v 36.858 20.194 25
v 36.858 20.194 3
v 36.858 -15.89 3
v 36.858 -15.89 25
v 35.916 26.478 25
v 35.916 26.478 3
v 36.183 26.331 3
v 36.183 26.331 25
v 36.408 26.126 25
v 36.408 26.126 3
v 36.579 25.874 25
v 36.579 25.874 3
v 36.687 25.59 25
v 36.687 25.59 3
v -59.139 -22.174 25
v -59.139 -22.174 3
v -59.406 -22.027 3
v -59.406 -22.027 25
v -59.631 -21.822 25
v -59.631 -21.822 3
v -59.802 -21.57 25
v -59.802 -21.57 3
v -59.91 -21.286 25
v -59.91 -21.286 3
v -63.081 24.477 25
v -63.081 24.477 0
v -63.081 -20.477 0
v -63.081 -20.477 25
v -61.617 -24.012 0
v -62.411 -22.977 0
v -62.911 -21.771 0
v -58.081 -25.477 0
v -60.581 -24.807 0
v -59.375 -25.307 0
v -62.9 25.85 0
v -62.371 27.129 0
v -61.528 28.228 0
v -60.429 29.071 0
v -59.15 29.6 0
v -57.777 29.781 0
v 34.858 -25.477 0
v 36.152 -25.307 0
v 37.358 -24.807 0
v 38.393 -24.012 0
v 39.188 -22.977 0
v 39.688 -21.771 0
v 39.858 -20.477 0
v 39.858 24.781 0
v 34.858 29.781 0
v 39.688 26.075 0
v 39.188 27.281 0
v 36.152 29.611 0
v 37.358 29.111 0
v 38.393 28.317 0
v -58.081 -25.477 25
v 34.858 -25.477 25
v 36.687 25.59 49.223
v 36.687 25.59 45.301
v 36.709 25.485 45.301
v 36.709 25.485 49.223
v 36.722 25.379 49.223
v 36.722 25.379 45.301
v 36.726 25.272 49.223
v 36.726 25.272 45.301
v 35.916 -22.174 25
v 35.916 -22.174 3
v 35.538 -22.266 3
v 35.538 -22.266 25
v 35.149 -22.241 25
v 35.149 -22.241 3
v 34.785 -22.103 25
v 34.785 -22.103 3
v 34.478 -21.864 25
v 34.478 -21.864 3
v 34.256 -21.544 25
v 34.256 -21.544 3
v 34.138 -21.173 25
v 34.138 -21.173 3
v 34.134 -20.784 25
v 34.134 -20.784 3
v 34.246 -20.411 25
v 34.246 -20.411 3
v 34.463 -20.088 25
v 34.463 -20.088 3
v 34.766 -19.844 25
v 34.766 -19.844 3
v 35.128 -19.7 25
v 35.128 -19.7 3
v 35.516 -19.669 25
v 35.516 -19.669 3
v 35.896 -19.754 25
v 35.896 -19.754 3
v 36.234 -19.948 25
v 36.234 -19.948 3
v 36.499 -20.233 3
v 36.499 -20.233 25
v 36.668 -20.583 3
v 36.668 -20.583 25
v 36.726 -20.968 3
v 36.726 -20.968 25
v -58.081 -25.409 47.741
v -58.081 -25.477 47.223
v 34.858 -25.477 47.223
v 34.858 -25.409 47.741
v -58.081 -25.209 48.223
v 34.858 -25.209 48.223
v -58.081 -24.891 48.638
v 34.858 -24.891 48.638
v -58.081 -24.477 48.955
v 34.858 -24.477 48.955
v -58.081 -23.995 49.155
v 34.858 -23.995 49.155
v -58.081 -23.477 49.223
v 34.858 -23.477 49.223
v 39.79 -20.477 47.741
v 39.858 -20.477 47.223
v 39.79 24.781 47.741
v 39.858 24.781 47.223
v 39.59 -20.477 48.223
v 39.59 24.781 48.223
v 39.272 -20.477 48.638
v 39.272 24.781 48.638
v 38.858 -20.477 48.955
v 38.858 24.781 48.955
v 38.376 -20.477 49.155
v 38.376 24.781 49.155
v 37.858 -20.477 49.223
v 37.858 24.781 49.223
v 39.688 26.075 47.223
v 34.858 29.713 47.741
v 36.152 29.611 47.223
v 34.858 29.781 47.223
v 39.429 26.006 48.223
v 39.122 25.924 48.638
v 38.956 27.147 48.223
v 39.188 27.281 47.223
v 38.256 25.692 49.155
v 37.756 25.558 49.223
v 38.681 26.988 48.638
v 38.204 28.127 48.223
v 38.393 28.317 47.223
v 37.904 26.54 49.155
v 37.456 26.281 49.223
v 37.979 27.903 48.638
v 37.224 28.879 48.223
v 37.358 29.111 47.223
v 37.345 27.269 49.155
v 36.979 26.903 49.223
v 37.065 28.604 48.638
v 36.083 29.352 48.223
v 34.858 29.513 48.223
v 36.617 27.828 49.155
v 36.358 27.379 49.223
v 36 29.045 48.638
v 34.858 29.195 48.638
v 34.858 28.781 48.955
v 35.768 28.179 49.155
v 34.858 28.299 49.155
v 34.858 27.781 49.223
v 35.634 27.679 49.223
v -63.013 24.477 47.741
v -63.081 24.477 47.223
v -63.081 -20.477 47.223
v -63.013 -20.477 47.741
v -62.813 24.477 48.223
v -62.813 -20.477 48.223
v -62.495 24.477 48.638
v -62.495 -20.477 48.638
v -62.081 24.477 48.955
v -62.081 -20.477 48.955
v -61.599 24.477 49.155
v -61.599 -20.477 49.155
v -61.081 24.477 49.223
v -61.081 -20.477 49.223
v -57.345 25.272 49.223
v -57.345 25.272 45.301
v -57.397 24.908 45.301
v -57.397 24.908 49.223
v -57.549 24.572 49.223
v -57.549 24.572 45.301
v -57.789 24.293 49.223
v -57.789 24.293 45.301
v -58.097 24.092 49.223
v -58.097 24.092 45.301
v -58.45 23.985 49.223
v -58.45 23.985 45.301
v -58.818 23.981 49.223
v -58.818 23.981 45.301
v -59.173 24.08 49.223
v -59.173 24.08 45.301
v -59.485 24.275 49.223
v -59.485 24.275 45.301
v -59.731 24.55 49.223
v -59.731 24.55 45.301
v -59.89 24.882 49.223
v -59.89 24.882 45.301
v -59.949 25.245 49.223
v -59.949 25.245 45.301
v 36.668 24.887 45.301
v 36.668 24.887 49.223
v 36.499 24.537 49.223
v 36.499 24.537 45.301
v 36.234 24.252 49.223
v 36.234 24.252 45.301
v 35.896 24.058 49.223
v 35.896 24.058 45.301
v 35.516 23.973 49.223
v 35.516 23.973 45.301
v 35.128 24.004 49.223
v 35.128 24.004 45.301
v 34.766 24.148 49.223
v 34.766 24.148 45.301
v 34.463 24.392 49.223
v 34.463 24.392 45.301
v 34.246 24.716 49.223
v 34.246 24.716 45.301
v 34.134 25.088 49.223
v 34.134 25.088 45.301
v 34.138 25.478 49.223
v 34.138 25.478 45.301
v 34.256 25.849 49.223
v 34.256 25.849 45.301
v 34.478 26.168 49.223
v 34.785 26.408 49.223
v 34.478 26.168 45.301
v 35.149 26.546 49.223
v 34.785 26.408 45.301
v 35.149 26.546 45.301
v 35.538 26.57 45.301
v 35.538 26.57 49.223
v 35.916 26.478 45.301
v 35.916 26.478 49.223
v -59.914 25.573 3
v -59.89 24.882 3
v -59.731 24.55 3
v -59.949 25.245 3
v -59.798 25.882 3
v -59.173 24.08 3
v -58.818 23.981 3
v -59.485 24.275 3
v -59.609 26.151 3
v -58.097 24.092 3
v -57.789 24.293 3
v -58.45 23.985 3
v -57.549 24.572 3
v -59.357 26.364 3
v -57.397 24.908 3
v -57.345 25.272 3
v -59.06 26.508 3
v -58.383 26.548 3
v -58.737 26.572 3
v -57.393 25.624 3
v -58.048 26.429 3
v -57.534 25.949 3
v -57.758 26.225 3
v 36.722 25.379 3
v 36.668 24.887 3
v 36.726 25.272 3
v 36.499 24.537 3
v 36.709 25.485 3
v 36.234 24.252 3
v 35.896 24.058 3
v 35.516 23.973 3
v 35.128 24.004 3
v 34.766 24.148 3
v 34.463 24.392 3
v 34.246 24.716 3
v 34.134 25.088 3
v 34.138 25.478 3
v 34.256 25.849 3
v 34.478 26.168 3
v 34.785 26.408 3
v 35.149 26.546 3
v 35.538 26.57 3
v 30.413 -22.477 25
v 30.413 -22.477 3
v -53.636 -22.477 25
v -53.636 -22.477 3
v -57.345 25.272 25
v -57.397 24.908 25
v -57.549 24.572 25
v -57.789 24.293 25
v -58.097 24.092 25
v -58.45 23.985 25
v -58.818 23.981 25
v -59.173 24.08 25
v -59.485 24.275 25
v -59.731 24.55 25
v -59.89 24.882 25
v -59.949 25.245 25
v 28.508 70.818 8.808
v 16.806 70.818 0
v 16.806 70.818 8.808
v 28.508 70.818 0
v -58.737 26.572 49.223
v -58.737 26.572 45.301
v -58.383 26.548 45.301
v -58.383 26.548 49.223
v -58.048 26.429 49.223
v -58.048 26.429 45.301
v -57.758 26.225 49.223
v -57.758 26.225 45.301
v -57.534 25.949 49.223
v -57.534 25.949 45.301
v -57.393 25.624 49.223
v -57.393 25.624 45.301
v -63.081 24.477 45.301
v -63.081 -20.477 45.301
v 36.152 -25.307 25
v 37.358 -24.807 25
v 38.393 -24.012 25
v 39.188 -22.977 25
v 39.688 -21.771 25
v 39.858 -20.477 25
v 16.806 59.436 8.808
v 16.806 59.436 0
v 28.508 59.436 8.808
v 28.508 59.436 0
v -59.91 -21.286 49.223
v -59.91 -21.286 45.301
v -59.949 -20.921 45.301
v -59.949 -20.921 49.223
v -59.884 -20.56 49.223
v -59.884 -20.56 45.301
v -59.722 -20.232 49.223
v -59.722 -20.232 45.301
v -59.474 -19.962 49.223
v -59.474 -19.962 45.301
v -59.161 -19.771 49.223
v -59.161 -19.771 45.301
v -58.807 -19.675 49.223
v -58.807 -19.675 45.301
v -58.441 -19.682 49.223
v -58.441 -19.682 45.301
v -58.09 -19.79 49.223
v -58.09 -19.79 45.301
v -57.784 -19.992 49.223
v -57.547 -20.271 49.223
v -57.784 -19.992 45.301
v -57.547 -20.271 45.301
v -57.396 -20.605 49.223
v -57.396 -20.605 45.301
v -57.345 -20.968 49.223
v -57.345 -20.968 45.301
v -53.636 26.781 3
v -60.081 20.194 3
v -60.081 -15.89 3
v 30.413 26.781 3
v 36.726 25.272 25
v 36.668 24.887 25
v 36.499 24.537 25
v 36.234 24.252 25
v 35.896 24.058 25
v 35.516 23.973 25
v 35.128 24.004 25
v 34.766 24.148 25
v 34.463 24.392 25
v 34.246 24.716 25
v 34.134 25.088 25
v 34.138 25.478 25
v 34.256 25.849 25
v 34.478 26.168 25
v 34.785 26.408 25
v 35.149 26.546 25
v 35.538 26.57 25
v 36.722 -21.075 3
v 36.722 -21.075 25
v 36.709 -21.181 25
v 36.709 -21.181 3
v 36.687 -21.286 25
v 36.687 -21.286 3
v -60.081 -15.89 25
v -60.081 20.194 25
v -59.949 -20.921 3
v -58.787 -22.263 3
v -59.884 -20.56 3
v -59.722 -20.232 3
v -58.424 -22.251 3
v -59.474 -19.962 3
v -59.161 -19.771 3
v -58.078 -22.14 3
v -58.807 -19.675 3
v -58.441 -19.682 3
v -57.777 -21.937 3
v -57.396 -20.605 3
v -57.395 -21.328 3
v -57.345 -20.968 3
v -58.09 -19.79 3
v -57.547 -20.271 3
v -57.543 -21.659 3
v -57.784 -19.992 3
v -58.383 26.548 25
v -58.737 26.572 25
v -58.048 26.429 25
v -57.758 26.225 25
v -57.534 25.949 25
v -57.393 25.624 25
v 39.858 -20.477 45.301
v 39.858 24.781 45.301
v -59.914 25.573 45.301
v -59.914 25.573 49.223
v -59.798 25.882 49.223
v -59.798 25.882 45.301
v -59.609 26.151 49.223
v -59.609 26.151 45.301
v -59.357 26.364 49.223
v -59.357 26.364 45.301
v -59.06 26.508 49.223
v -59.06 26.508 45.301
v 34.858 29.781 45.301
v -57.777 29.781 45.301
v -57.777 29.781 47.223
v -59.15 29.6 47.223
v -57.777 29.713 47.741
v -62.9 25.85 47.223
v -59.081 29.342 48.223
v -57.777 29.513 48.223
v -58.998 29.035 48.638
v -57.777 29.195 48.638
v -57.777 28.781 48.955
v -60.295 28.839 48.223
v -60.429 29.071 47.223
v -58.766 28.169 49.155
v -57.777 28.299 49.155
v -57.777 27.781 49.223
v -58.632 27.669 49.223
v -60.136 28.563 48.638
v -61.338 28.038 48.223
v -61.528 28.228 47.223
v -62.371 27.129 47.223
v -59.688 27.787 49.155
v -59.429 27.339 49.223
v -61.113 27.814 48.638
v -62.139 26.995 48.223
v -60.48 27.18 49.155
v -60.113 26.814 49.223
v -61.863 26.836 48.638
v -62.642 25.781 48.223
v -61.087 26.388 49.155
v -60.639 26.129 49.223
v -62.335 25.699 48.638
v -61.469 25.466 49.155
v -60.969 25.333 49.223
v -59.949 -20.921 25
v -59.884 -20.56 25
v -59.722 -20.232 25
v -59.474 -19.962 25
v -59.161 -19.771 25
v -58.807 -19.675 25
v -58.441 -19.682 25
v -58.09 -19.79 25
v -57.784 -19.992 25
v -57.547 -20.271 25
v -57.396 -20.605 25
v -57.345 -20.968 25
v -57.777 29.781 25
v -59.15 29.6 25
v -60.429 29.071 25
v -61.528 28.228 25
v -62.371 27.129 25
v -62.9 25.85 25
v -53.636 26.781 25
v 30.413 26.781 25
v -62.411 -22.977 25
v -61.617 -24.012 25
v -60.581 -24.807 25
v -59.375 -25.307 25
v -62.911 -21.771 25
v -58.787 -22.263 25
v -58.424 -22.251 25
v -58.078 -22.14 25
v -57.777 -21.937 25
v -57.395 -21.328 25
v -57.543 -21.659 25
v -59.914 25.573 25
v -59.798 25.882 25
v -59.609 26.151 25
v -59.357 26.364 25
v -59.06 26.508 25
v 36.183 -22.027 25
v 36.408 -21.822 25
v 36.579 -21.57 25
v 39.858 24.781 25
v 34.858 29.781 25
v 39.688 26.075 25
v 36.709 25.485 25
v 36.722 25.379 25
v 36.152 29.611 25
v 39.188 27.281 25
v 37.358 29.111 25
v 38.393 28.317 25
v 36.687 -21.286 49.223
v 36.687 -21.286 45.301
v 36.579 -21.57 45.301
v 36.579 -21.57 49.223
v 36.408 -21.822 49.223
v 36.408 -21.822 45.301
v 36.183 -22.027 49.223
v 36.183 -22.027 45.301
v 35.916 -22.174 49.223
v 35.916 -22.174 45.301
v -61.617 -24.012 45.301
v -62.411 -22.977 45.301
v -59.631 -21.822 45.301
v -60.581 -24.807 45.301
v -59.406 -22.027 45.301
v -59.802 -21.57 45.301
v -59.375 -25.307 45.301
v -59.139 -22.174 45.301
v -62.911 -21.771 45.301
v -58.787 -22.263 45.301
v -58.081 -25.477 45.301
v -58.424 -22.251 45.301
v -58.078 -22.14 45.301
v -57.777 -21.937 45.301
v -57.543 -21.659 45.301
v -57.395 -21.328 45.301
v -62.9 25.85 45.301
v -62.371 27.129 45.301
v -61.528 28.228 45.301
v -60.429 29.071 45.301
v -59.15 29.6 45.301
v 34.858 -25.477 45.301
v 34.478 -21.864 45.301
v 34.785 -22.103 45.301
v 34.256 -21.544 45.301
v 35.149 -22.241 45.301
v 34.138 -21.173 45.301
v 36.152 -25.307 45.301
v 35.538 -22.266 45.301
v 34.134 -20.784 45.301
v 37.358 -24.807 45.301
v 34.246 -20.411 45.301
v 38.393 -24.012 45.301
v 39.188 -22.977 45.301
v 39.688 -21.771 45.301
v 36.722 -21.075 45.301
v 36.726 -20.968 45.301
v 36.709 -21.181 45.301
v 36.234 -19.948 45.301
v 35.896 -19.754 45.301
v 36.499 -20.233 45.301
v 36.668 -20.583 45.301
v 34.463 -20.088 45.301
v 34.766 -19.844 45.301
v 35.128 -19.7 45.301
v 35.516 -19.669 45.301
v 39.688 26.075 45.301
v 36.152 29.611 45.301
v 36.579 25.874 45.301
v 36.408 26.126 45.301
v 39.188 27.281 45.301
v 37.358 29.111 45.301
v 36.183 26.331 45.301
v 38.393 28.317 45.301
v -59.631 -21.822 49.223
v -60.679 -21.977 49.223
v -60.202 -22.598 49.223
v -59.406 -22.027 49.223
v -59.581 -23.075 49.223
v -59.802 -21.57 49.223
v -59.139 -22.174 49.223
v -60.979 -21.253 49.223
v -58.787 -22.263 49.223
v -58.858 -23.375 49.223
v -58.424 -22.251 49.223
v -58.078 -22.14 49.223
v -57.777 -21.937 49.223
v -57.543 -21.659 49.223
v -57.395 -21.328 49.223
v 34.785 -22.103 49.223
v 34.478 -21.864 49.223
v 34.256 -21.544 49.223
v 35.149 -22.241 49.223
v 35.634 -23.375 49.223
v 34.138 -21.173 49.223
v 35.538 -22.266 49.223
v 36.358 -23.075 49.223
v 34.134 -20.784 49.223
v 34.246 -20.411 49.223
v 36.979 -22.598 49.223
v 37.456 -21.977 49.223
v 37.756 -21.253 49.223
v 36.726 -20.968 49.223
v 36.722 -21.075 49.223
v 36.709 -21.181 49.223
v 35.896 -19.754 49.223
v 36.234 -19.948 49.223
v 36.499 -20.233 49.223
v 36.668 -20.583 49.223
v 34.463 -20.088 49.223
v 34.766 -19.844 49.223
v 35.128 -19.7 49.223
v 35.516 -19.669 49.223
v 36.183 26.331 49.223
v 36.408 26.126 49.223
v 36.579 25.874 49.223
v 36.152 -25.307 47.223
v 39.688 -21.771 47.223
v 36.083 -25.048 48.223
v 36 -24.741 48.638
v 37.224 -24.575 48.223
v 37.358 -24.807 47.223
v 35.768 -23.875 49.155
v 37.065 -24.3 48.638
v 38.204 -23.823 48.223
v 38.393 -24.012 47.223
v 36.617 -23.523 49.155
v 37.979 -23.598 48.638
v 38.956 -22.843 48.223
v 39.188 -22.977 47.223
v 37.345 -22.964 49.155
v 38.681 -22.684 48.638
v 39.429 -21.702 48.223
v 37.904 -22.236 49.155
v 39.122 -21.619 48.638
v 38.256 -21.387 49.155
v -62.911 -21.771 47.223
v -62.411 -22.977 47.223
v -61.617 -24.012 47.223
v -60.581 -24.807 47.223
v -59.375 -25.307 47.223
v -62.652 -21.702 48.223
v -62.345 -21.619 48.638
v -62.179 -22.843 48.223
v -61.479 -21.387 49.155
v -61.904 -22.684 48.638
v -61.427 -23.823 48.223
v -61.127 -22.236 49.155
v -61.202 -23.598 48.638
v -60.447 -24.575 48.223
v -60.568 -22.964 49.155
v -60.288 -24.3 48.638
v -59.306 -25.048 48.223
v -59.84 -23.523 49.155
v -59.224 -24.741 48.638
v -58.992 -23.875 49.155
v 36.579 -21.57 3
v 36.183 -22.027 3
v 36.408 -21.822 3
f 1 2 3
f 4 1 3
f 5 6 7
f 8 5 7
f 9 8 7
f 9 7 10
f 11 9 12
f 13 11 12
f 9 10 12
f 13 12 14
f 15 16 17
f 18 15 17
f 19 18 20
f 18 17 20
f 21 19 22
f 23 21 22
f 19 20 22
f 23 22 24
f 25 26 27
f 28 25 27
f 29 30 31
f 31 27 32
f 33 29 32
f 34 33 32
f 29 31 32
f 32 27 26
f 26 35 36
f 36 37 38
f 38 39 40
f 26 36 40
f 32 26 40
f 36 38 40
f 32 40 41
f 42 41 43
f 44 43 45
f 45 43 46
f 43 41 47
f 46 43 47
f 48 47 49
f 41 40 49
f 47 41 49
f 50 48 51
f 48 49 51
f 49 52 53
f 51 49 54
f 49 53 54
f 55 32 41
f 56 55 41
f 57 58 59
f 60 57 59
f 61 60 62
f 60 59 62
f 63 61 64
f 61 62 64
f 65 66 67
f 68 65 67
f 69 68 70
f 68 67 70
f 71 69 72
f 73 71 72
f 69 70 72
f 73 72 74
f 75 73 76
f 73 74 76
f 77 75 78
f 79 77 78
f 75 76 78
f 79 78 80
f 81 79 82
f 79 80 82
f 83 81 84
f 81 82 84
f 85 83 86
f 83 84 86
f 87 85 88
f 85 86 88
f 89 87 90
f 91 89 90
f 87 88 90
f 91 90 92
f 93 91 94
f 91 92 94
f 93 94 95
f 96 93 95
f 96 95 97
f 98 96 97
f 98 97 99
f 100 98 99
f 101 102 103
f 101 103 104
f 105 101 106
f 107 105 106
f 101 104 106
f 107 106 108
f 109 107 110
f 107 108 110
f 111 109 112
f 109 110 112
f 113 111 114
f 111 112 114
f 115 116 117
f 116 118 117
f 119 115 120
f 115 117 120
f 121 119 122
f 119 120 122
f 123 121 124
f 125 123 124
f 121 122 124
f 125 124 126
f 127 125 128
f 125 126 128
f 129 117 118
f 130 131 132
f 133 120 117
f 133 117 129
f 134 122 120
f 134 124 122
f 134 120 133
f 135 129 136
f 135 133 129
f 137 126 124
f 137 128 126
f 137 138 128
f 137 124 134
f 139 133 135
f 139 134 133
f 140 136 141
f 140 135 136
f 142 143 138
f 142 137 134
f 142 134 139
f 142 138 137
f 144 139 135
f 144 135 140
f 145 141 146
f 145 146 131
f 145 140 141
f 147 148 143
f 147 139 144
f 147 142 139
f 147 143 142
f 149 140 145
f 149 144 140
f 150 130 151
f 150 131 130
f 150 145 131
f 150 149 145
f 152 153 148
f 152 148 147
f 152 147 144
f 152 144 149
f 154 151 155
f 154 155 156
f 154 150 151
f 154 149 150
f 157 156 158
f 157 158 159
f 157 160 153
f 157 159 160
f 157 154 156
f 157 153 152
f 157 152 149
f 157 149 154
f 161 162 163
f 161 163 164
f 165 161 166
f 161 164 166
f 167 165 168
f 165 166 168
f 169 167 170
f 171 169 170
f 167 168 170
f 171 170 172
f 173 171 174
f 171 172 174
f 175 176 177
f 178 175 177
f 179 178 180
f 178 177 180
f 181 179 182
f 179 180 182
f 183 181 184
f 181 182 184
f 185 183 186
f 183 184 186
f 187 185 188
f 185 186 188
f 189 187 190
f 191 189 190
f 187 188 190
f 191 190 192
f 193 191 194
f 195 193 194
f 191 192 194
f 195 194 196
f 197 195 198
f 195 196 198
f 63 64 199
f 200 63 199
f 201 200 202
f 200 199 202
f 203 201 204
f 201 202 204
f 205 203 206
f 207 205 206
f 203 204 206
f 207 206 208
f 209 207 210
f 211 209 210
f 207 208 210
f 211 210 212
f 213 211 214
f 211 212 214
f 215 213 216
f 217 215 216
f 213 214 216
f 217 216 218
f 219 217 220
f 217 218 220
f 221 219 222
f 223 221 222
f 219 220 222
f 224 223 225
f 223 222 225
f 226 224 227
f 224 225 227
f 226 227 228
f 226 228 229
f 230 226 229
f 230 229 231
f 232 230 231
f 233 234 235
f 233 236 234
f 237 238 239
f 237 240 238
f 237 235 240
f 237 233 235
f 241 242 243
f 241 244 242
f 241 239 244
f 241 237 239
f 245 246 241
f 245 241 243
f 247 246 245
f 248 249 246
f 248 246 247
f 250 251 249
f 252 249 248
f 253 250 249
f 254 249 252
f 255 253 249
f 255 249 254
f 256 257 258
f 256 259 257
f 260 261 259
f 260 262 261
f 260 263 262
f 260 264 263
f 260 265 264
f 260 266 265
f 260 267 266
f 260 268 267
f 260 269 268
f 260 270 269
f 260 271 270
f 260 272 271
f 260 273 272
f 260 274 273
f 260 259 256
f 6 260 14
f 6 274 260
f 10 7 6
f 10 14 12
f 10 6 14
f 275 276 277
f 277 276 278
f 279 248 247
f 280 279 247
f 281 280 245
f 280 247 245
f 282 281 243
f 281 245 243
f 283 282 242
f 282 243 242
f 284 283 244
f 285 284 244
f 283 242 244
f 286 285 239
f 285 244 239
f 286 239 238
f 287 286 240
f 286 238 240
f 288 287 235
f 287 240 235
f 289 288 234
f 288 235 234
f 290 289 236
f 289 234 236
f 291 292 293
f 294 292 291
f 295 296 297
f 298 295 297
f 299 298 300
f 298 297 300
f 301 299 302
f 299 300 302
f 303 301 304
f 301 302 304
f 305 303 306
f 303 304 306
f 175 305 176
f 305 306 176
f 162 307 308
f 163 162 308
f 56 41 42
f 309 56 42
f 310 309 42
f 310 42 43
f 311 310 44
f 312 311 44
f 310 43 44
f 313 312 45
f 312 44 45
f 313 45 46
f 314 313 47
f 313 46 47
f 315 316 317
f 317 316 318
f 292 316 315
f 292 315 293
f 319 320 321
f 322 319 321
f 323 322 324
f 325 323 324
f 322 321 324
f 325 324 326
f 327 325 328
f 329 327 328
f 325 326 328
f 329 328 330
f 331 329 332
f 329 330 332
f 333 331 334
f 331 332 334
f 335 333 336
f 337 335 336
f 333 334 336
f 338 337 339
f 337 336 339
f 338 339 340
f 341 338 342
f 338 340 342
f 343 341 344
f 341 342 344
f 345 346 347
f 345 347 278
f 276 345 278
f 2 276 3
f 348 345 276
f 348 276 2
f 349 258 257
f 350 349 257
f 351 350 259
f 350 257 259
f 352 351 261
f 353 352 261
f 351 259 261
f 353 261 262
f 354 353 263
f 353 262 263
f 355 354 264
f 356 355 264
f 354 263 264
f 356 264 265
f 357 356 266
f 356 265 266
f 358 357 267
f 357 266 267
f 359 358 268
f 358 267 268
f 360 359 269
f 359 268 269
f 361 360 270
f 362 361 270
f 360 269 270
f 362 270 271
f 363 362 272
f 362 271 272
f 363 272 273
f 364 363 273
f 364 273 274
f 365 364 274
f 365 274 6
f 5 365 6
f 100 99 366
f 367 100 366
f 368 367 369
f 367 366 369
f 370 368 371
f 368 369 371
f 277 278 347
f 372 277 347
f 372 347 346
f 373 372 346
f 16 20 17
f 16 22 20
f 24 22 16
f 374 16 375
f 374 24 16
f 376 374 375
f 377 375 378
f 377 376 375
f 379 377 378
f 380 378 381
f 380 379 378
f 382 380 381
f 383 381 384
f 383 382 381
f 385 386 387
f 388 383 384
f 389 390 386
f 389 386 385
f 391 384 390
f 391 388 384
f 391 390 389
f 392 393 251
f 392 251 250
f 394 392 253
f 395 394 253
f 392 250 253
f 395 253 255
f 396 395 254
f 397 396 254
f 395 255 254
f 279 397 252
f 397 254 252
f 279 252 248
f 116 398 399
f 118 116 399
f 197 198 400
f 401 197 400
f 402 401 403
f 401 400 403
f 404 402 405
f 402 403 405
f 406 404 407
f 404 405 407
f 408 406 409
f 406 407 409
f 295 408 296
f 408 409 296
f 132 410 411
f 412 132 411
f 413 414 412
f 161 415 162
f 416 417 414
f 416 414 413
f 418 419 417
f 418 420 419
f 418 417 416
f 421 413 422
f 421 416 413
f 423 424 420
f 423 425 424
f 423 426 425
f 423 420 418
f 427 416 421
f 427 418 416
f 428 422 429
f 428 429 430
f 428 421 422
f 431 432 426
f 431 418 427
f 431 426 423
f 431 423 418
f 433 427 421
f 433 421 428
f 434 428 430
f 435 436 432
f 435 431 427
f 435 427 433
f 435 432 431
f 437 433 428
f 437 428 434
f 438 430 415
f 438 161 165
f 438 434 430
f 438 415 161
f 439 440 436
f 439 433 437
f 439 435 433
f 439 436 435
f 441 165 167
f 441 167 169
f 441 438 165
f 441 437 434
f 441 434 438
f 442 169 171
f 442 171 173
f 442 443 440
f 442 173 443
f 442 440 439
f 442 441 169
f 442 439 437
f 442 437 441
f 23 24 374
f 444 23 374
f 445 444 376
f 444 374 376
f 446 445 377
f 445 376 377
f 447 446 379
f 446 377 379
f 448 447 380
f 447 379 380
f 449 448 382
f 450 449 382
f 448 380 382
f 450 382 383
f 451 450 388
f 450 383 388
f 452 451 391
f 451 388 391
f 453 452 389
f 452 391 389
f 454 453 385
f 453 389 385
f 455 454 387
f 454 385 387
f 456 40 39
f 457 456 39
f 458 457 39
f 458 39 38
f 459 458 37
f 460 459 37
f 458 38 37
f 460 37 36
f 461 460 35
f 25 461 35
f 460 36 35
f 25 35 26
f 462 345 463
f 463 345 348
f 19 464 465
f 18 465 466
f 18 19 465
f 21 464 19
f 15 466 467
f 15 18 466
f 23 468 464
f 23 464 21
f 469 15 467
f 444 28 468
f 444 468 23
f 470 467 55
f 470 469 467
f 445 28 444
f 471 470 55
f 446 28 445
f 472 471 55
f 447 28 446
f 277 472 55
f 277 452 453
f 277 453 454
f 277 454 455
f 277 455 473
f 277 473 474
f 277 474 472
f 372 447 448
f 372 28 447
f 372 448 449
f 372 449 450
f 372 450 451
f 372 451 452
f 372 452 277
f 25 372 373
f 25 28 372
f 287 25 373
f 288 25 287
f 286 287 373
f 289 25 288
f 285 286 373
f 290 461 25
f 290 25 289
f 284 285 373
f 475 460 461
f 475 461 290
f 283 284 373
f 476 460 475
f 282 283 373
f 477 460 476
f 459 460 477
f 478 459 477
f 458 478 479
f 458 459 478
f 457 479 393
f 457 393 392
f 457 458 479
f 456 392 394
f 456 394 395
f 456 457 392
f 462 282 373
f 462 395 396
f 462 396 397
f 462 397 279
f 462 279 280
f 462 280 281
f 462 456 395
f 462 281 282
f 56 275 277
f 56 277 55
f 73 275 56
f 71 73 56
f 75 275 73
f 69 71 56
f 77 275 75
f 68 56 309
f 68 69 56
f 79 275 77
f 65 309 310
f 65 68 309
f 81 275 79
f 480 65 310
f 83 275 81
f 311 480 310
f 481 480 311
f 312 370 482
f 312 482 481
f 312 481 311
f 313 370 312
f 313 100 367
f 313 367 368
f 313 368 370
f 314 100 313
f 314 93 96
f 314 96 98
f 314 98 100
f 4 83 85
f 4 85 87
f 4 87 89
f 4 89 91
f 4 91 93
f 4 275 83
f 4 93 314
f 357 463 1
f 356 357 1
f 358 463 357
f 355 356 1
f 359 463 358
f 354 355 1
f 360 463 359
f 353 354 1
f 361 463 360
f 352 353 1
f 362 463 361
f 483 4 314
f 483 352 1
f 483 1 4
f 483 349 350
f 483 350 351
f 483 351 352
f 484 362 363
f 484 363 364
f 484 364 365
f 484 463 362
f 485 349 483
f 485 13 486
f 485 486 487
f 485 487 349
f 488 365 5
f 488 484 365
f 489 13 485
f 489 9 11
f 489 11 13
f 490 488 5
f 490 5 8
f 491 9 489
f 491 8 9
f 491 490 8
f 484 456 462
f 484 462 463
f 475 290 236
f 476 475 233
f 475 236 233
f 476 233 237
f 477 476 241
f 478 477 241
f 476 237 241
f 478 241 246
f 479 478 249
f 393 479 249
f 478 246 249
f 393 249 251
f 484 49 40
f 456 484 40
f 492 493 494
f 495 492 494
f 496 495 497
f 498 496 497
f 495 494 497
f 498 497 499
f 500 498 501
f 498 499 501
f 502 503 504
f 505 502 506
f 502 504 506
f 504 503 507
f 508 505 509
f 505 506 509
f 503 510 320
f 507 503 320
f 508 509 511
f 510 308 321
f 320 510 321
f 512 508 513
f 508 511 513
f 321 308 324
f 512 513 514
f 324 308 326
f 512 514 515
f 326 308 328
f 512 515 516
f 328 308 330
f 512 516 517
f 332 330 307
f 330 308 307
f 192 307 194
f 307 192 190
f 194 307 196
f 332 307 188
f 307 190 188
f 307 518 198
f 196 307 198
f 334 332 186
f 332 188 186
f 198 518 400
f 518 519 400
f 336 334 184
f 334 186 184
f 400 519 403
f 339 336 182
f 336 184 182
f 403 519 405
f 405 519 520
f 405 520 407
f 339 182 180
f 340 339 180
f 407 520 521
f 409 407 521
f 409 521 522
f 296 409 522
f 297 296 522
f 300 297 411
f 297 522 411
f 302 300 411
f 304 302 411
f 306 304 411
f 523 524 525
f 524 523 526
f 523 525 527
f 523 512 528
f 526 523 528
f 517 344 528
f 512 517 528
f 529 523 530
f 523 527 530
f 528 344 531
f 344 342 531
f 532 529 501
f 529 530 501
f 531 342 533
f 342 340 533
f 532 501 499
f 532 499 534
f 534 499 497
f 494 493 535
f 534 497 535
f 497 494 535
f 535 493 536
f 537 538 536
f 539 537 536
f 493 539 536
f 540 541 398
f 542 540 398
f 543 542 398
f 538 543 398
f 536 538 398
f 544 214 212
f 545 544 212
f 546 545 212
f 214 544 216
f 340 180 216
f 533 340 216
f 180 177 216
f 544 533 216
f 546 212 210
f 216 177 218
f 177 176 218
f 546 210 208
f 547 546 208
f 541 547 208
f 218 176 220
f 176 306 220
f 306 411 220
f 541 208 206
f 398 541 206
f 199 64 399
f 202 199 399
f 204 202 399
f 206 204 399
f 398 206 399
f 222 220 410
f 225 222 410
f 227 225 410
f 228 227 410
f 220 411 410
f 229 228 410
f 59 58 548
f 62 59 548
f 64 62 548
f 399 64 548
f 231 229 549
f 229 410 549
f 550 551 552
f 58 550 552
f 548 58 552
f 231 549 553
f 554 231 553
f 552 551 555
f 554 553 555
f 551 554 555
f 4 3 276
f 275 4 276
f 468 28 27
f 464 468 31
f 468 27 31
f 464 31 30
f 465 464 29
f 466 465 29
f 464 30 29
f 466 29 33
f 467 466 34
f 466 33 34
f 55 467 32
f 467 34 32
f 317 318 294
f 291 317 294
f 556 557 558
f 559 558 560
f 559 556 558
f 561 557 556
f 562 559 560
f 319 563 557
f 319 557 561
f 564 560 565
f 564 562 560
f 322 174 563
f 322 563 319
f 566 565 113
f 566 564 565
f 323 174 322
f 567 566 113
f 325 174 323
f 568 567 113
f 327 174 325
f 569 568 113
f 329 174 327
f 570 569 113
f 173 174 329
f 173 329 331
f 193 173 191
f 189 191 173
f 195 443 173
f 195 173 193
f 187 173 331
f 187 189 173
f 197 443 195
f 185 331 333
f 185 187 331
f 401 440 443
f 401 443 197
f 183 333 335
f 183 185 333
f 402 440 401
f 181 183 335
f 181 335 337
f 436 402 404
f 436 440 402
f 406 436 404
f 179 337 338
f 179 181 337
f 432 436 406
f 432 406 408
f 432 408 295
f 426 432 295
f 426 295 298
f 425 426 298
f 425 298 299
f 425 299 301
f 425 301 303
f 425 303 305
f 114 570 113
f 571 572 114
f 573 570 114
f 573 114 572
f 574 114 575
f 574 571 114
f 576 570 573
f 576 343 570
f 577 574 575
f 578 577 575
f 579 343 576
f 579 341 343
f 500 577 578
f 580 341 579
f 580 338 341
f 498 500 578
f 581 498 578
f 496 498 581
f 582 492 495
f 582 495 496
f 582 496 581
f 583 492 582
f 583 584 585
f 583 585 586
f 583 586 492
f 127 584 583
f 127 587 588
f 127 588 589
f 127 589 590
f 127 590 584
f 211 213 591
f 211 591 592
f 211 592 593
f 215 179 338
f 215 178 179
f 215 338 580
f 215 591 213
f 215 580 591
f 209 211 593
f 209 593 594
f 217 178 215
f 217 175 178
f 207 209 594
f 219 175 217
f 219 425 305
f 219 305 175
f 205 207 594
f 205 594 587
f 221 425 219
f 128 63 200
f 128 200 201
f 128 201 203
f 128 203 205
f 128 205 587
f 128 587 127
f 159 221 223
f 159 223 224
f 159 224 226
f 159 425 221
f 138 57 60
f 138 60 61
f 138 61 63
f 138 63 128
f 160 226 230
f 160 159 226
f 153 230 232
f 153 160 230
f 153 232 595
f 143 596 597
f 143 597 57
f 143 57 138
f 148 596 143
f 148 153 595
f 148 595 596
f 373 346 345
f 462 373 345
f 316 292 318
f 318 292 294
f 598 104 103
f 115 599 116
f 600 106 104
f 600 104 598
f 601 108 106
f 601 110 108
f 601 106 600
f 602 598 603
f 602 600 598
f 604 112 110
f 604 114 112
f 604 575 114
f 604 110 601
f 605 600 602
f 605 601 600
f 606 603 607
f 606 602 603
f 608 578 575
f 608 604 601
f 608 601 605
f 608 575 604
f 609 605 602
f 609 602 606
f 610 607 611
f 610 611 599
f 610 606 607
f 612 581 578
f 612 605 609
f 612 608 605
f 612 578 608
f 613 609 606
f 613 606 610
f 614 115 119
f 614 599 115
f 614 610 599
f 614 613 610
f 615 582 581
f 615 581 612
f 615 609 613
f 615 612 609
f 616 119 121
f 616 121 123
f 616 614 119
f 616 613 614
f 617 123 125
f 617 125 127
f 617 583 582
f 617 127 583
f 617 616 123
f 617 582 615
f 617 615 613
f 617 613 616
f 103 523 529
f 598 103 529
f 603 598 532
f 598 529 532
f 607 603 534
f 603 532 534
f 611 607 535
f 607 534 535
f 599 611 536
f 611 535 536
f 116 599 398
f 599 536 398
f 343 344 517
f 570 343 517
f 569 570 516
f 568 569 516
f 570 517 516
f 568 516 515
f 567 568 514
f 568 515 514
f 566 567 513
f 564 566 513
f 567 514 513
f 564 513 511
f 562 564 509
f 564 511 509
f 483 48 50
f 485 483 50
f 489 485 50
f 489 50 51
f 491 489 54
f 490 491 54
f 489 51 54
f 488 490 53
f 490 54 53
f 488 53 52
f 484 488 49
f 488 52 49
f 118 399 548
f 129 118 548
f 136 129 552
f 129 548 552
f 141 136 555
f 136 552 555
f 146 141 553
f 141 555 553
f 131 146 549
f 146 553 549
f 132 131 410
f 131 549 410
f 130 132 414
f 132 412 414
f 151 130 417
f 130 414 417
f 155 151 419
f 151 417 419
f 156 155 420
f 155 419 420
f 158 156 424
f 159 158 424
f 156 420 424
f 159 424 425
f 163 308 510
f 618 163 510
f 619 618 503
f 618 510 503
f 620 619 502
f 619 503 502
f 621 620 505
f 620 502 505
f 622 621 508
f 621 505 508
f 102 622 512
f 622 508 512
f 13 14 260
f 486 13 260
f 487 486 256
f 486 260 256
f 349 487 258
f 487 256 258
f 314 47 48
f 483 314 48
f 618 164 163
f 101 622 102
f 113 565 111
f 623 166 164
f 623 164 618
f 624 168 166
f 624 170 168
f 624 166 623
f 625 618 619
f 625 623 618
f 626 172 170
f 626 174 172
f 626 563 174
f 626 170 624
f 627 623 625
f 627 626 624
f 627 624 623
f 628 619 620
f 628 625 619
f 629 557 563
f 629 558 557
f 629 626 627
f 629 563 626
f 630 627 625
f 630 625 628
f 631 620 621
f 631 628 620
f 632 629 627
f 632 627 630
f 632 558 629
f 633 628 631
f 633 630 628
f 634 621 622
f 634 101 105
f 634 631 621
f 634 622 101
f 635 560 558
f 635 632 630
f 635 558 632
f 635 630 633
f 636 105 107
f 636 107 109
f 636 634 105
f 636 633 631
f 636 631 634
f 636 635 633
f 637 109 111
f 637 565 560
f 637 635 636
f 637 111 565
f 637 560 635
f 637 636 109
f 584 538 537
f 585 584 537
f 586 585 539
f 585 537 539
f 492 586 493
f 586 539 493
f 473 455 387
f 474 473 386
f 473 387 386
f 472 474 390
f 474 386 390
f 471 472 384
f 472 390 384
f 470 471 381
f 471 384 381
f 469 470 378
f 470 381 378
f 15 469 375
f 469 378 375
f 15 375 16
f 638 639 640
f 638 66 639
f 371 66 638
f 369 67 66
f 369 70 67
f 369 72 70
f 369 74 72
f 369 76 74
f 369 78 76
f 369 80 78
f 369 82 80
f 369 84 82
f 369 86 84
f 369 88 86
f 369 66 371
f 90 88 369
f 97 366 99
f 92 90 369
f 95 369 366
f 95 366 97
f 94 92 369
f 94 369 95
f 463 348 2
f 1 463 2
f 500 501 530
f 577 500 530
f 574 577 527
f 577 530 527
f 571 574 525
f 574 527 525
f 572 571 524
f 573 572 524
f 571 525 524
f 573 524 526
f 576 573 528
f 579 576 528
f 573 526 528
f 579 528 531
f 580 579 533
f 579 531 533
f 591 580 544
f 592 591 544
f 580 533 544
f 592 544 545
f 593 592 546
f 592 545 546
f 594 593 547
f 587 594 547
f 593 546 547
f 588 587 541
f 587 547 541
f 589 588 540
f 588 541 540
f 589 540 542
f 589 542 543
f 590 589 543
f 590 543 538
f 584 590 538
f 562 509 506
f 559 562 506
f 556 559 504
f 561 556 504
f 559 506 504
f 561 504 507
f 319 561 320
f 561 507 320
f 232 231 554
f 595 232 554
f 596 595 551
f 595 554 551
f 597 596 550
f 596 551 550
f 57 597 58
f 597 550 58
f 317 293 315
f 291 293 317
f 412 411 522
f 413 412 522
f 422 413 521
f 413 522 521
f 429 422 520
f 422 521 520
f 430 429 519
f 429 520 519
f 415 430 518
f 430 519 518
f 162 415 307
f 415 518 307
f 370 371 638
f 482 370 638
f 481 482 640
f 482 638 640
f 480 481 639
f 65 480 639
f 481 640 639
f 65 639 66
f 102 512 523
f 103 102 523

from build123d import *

# Parameters (mm, degrees)
F1_W     = 11.7021854967
F1_H     = 11.3825649023
F2_DEPTH = 8.80794
F4_DEPTH = 3
F3_DEPTH = 25
F5_START = 45.3010783531
F5_DEPTH = 3.9222645573
F6_R     = 2


with BuildPart() as f2:
    # F1 (on Top) → F2 (new body)
    with BuildSketch(Plane.XY):
        with Locations((22.6566782221, 65.1267915964)):
            Rectangle(F1_W, F1_H)
    extrude(amount=F2_DEPTH)


with BuildPart() as f4:
    # F0 (on Top) → F4 (new body)
    with BuildSketch(Plane.XY):
        with BuildLine():
            Line((34.857919652, 29.7812012451), (-57.7773717009, 29.7812012451))
            ThreePointArc((-57.7773717009, 29.7812012451), (-61.5276951664, 28.2277664023), (-63.0811300092, 24.4774429368))
            Line((-63.0811300092, 24.4774429368), (-63.0811300092, -20.4768940194))
            ThreePointArc((-63.0811300092, -20.4768940194), (-61.6166639151, -24.0124279253), (-58.0811300092, -25.4768940194))
            Line((-58.0811300092, -25.4768940194), (34.857919652, -25.4768940194))
            ThreePointArc((34.857919652, -25.4768940194), (38.3934535579, -24.0124279253), (39.857919652, -20.4768940194))
            Line((39.857919652, -20.4768940194), (39.857919652, 24.7812012451))
            ThreePointArc((39.857919652, 24.7812012451), (38.3934535579, 28.316735151), (34.857919652, 29.7812012451))
        make_face()
        with BuildLine():
            ThreePointArc((-58.73700955, 26.5718157645), (-58.2684793981, 26.728246254), (-57.7773717009, 26.7812012451))
            Line((-57.7773717009, 26.7812012451), (-53.6363086646, 26.7812012451))
            Line((-53.6363086646, 26.7812012451), (30.4130983075, 26.7812012451))
            Line((30.4130983075, 26.7812012451), (34.857919652, 26.7812012451))
            ThreePointArc((34.857919652, 26.7812012451), (35.4082478015, 26.7039958071), (35.9160876252, 26.4783401729))
            ThreePointArc((35.9160876252, 26.4783401729), (36.4076128264, 26.1261211128), (36.6871265124, 25.5899053082))
            ThreePointArc((36.6871265124, 25.5899053082), (36.8147555829, 25.1944725114), (36.857919652, 24.7812012451))
            Line((36.857919652, 24.7812012451), (36.857919652, 20.1944987733))
            Line((36.857919652, 20.1944987733), (36.857919652, -15.8901915476))
            Line((36.857919652, -15.8901915476), (36.857919652, -20.4768940194))
            ThreePointArc((36.857919652, -20.4768940194), (36.8147555829, -20.8901652857), (36.6871265124, -21.2855980825))
            ThreePointArc((36.6871265124, -21.2855980825), (36.4076128264, -21.8218138871), (35.9160876252, -22.1740329472))
            ThreePointArc((35.9160876252, -22.1740329472), (35.4082478015, -22.3996885814), (34.857919652, -22.4768940194))
            Line((34.857919652, -22.4768940194), (30.4130983075, -22.4768940194))
            Line((30.4130983075, -22.4768940194), (-53.6363086646, -22.4768940194))
            Line((-53.6363086646, -22.4768940194), (-58.0811300092, -22.4768940194))
            ThreePointArc((-58.0811300092, -22.4768940194), (-58.6314581587, -22.3996885814), (-59.1392979824, -22.1740329472))
            ThreePointArc((-59.1392979824, -22.1740329472), (-59.6308231836, -21.8218138871), (-59.9103368696, -21.2855980825))
            ThreePointArc((-59.9103368696, -21.2855980825), (-60.0379659401, -20.8901652857), (-60.0811300092, -20.4768940194))
            Line((-60.0811300092, -20.4768940194), (-60.0811300092, -15.8901915476))
            Line((-60.0811300092, -15.8901915476), (-60.0811300092, 20.1944987733))
            Line((-60.0811300092, 20.1944987733), (-60.0811300092, 24.4774429368))
            ThreePointArc((-60.0811300092, 24.4774429368), (-60.0479477693, 24.8670410125), (-59.9493569321, 25.2454159171))
            ThreePointArc((-59.9493569321, 25.2454159171), (-59.6085321277, 26.1511483084), (-58.73700955, 26.5718157645))
        make_face(mode=Mode.SUBTRACT)
        Polygon((30.4130983075, 26.7812012451), (-53.6363086646, 26.7812012451), (-60.0811300092, 20.1944987733), (-60.0811300092, -15.8901915476), (-53.6363086646, -22.4768940194), (30.4130983075, -22.4768940194), (36.857919652, -15.8901915476), (36.857919652, 20.1944987733), align=None)
        with BuildLine():
            Line((34.857919652, 26.7812012451), (30.4130983075, 26.7812012451))
            Line((30.4130983075, 26.7812012451), (36.857919652, 20.1944987733))
            Line((36.857919652, 20.1944987733), (36.857919652, 24.7812012451))
            ThreePointArc((36.857919652, 24.7812012451), (36.8147555829, 25.1944725114), (36.6871265124, 25.5899053082))
            ThreePointArc((36.6871265124, 25.5899053082), (36.7165632812, 25.4323448054), (36.7264253162, 25.2723617573))
            ThreePointArc((36.7264253162, 25.2723617573), (34.342700624, 24.5458923649), (35.9160876252, 26.4783401729))
            ThreePointArc((35.9160876252, 26.4783401729), (35.4082478015, 26.7039958071), (34.857919652, 26.7812012451))
        make_face()
        with BuildLine():
            Line((-53.6363086646, -22.4768940194), (-60.0811300092, -15.8901915476))
            Line((-60.0811300092, -15.8901915476), (-60.0811300092, -20.4768940194))
            ThreePointArc((-60.0811300092, -20.4768940194), (-60.0379659401, -20.8901652857), (-59.9103368696, -21.2855980825))
            ThreePointArc((-59.9103368696, -21.2855980825), (-58.8070561381, -19.6753539832), (-57.3445105066, -20.9680545316))
            ThreePointArc((-57.3445105066, -20.9680545316), (-57.9206036976, -22.0492166404), (-59.1392979824, -22.1740329472))
            ThreePointArc((-59.1392979824, -22.1740329472), (-58.6314581587, -22.3996885814), (-58.0811300092, -22.4768940194))
            Line((-58.0811300092, -22.4768940194), (-53.6363086646, -22.4768940194))
        make_face()
        with BuildLine():
            Line((36.857919652, -20.4768940194), (36.857919652, -15.8901915476))
            Line((36.857919652, -15.8901915476), (30.4130983075, -22.4768940194))
            Line((30.4130983075, -22.4768940194), (34.857919652, -22.4768940194))
            ThreePointArc((34.857919652, -22.4768940194), (35.4082478015, -22.3996885814), (35.9160876252, -22.1740329472))
            ThreePointArc((35.9160876252, -22.1740329472), (34.342700624, -20.2415851392), (36.7264253162, -20.9680545316))
            ThreePointArc((36.7264253162, -20.9680545316), (36.7165632812, -21.1280375797), (36.6871265124, -21.2855980825))
            ThreePointArc((36.6871265124, -21.2855980825), (36.8147555829, -20.8901652857), (36.857919652, -20.4768940194))
        make_face()
        with BuildLine():
            Line((-53.6363086646, 26.7812012451), (-57.7773717009, 26.7812012451))
            ThreePointArc((-57.7773717009, 26.7812012451), (-58.2684793981, 26.728246254), (-58.73700955, 26.5718157645))
            ThreePointArc((-58.73700955, 26.5718157645), (-57.7583882707, 26.2246792336), (-57.3445105066, 25.2723617573))
            ThreePointArc((-57.3445105066, 25.2723617573), (-58.6335994491, 23.9698688611), (-59.9493569321, 25.2454159171))
            ThreePointArc((-59.9493569321, 25.2454159171), (-60.0479477693, 24.8670410125), (-60.0811300092, 24.4774429368))
            Line((-60.0811300092, 24.4774429368), (-60.0811300092, 20.1944987733))
            Line((-60.0811300092, 20.1944987733), (-53.6363086646, 26.7812012451))
        make_face()
        with BuildLine():
            ThreePointArc((-57.3445105066, -20.9680545316), (-58.8070561381, -19.6753539832), (-59.9103368696, -21.2855980825))
            ThreePointArc((-59.9103368696, -21.2855980825), (-59.591614198, -21.7877858972), (-59.1392979824, -22.1740329472))
            ThreePointArc((-59.1392979824, -22.1740329472), (-57.9206036976, -22.0492166404), (-57.3445105066, -20.9680545316))
        make_face()
        with BuildLine():
            ThreePointArc((36.6871265124, 25.5899053082), (36.3684038408, 26.0920931229), (35.9160876252, 26.4783401729))
            ThreePointArc((35.9160876252, 26.4783401729), (34.342700624, 24.5458923649), (36.7264253162, 25.2723617573))
            ThreePointArc((36.7264253162, 25.2723617573), (36.7165632812, 25.4323448054), (36.6871265124, 25.5899053082))
        make_face()
        with BuildLine():
            ThreePointArc((35.9160876252, -22.1740329472), (36.3684038408, -21.7877858972), (36.6871265124, -21.2855980825))
            ThreePointArc((36.6871265124, -21.2855980825), (36.7165632812, -21.1280375797), (36.7264253162, -20.9680545316))
            ThreePointArc((36.7264253162, -20.9680545316), (34.342700624, -20.2415851392), (35.9160876252, -22.1740329472))
        make_face()
        with BuildLine():
            ThreePointArc((-57.3445105066, 25.2723617573), (-57.7583882707, 26.2246792336), (-58.73700955, 26.5718157645))
            ThreePointArc((-58.73700955, 26.5718157645), (-59.4778421999, 26.0316959487), (-59.9493569321, 25.2454159171))
            ThreePointArc((-59.9493569321, 25.2454159171), (-58.6335994491, 23.9698688611), (-57.3445105066, 25.2723617573))
        make_face()
        with BuildLine():
            ThreePointArc((-59.9493569321, 25.2454159171), (-59.4778421999, 26.0316959487), (-58.73700955, 26.5718157645))
            ThreePointArc((-58.73700955, 26.5718157645), (-59.6085321277, 26.1511483084), (-59.9493569321, 25.2454159171))
        make_face()
        with BuildLine():
            ThreePointArc((-59.1392979824, -22.1740329472), (-59.591614198, -21.7877858972), (-59.9103368696, -21.2855980825))
            ThreePointArc((-59.9103368696, -21.2855980825), (-59.6308231836, -21.8218138871), (-59.1392979824, -22.1740329472))
        make_face()
        with BuildLine():
            ThreePointArc((36.6871265124, 25.5899053082), (36.4076128264, 26.1261211128), (35.9160876252, 26.4783401729))
            ThreePointArc((35.9160876252, 26.4783401729), (36.3684038408, 26.0920931229), (36.6871265124, 25.5899053082))
        make_face()
        with BuildLine():
            ThreePointArc((35.9160876252, -22.1740329472), (36.4076128264, -21.8218138871), (36.6871265124, -21.2855980825))
            ThreePointArc((36.6871265124, -21.2855980825), (36.3684038408, -21.7877858972), (35.9160876252, -22.1740329472))
        make_face()
    extrude(amount=F4_DEPTH)

    # F0 (on Top) → F3 (join)
    with BuildSketch(Plane.XY):
        with BuildLine():
            Line((34.857919652, 29.7812012451), (-57.7773717009, 29.7812012451))
            ThreePointArc((-57.7773717009, 29.7812012451), (-61.5276951664, 28.2277664023), (-63.0811300092, 24.4774429368))
            Line((-63.0811300092, 24.4774429368), (-63.0811300092, -20.4768940194))
            ThreePointArc((-63.0811300092, -20.4768940194), (-61.6166639151, -24.0124279253), (-58.0811300092, -25.4768940194))
            Line((-58.0811300092, -25.4768940194), (34.857919652, -25.4768940194))
            ThreePointArc((34.857919652, -25.4768940194), (38.3934535579, -24.0124279253), (39.857919652, -20.4768940194))
            Line((39.857919652, -20.4768940194), (39.857919652, 24.7812012451))
            ThreePointArc((39.857919652, 24.7812012451), (38.3934535579, 28.316735151), (34.857919652, 29.7812012451))
        make_face()
        with BuildLine():
            ThreePointArc((-58.73700955, 26.5718157645), (-58.2684793981, 26.728246254), (-57.7773717009, 26.7812012451))
            Line((-57.7773717009, 26.7812012451), (-53.6363086646, 26.7812012451))
            Line((-53.6363086646, 26.7812012451), (30.4130983075, 26.7812012451))
            Line((30.4130983075, 26.7812012451), (34.857919652, 26.7812012451))
            ThreePointArc((34.857919652, 26.7812012451), (35.4082478015, 26.7039958071), (35.9160876252, 26.4783401729))
            ThreePointArc((35.9160876252, 26.4783401729), (36.4076128264, 26.1261211128), (36.6871265124, 25.5899053082))
            ThreePointArc((36.6871265124, 25.5899053082), (36.8147555829, 25.1944725114), (36.857919652, 24.7812012451))
            Line((36.857919652, 24.7812012451), (36.857919652, 20.1944987733))
            Line((36.857919652, 20.1944987733), (36.857919652, -15.8901915476))
            Line((36.857919652, -15.8901915476), (36.857919652, -20.4768940194))
            ThreePointArc((36.857919652, -20.4768940194), (36.8147555829, -20.8901652857), (36.6871265124, -21.2855980825))
            ThreePointArc((36.6871265124, -21.2855980825), (36.4076128264, -21.8218138871), (35.9160876252, -22.1740329472))
            ThreePointArc((35.9160876252, -22.1740329472), (35.4082478015, -22.3996885814), (34.857919652, -22.4768940194))
            Line((34.857919652, -22.4768940194), (30.4130983075, -22.4768940194))
            Line((30.4130983075, -22.4768940194), (-53.6363086646, -22.4768940194))
            Line((-53.6363086646, -22.4768940194), (-58.0811300092, -22.4768940194))
            ThreePointArc((-58.0811300092, -22.4768940194), (-58.6314581587, -22.3996885814), (-59.1392979824, -22.1740329472))
            ThreePointArc((-59.1392979824, -22.1740329472), (-59.6308231836, -21.8218138871), (-59.9103368696, -21.2855980825))
            ThreePointArc((-59.9103368696, -21.2855980825), (-60.0379659401, -20.8901652857), (-60.0811300092, -20.4768940194))
            Line((-60.0811300092, -20.4768940194), (-60.0811300092, -15.8901915476))
            Line((-60.0811300092, -15.8901915476), (-60.0811300092, 20.1944987733))
            Line((-60.0811300092, 20.1944987733), (-60.0811300092, 24.4774429368))
            ThreePointArc((-60.0811300092, 24.4774429368), (-60.0479477693, 24.8670410125), (-59.9493569321, 25.2454159171))
            ThreePointArc((-59.9493569321, 25.2454159171), (-59.6085321277, 26.1511483084), (-58.73700955, 26.5718157645))
        make_face(mode=Mode.SUBTRACT)
        with BuildLine():
            Line((36.857919652, -20.4768940194), (36.857919652, -15.8901915476))
            Line((36.857919652, -15.8901915476), (30.4130983075, -22.4768940194))
            Line((30.4130983075, -22.4768940194), (34.857919652, -22.4768940194))
            ThreePointArc((34.857919652, -22.4768940194), (35.4082478015, -22.3996885814), (35.9160876252, -22.1740329472))
            ThreePointArc((35.9160876252, -22.1740329472), (34.342700624, -20.2415851392), (36.7264253162, -20.9680545316))
            ThreePointArc((36.7264253162, -20.9680545316), (36.7165632812, -21.1280375797), (36.6871265124, -21.2855980825))
            ThreePointArc((36.6871265124, -21.2855980825), (36.8147555829, -20.8901652857), (36.857919652, -20.4768940194))
        make_face()
        with BuildLine():
            Line((34.857919652, 26.7812012451), (30.4130983075, 26.7812012451))
            Line((30.4130983075, 26.7812012451), (36.857919652, 20.1944987733))
            Line((36.857919652, 20.1944987733), (36.857919652, 24.7812012451))
            ThreePointArc((36.857919652, 24.7812012451), (36.8147555829, 25.1944725114), (36.6871265124, 25.5899053082))
            ThreePointArc((36.6871265124, 25.5899053082), (36.7165632812, 25.4323448054), (36.7264253162, 25.2723617573))
            ThreePointArc((36.7264253162, 25.2723617573), (34.342700624, 24.5458923649), (35.9160876252, 26.4783401729))
            ThreePointArc((35.9160876252, 26.4783401729), (35.4082478015, 26.7039958071), (34.857919652, 26.7812012451))
        make_face()
        with BuildLine():
            Line((-53.6363086646, 26.7812012451), (-57.7773717009, 26.7812012451))
            ThreePointArc((-57.7773717009, 26.7812012451), (-58.2684793981, 26.728246254), (-58.73700955, 26.5718157645))
            ThreePointArc((-58.73700955, 26.5718157645), (-57.7583882707, 26.2246792336), (-57.3445105066, 25.2723617573))
            ThreePointArc((-57.3445105066, 25.2723617573), (-58.6335994491, 23.9698688611), (-59.9493569321, 25.2454159171))
            ThreePointArc((-59.9493569321, 25.2454159171), (-60.0479477693, 24.8670410125), (-60.0811300092, 24.4774429368))
            Line((-60.0811300092, 24.4774429368), (-60.0811300092, 20.1944987733))
            Line((-60.0811300092, 20.1944987733), (-53.6363086646, 26.7812012451))
        make_face()
        with BuildLine():
            Line((-53.6363086646, -22.4768940194), (-60.0811300092, -15.8901915476))
            Line((-60.0811300092, -15.8901915476), (-60.0811300092, -20.4768940194))
            ThreePointArc((-60.0811300092, -20.4768940194), (-60.0379659401, -20.8901652857), (-59.9103368696, -21.2855980825))
            ThreePointArc((-59.9103368696, -21.2855980825), (-58.8070561381, -19.6753539832), (-57.3445105066, -20.9680545316))
            ThreePointArc((-57.3445105066, -20.9680545316), (-57.9206036976, -22.0492166404), (-59.1392979824, -22.1740329472))
            ThreePointArc((-59.1392979824, -22.1740329472), (-58.6314581587, -22.3996885814), (-58.0811300092, -22.4768940194))
            Line((-58.0811300092, -22.4768940194), (-53.6363086646, -22.4768940194))
        make_face()
    extrude(amount=F3_DEPTH)


with BuildPart() as f5:
    # F0 (on Top) → F5 (new body)
    with BuildSketch(Plane.XY.offset(F5_START)):
        with BuildLine():
            Line((34.857919652, 29.7812012451), (-57.7773717009, 29.7812012451))
            ThreePointArc((-57.7773717009, 29.7812012451), (-61.5276951664, 28.2277664023), (-63.0811300092, 24.4774429368))
            Line((-63.0811300092, 24.4774429368), (-63.0811300092, -20.4768940194))
            ThreePointArc((-63.0811300092, -20.4768940194), (-61.6166639151, -24.0124279253), (-58.0811300092, -25.4768940194))
            Line((-58.0811300092, -25.4768940194), (34.857919652, -25.4768940194))
            ThreePointArc((34.857919652, -25.4768940194), (38.3934535579, -24.0124279253), (39.857919652, -20.4768940194))
            Line((39.857919652, -20.4768940194), (39.857919652, 24.7812012451))
            ThreePointArc((39.857919652, 24.7812012451), (38.3934535579, 28.316735151), (34.857919652, 29.7812012451))
        make_face()
        with BuildLine():
            ThreePointArc((-58.73700955, 26.5718157645), (-58.2684793981, 26.728246254), (-57.7773717009, 26.7812012451))
            Line((-57.7773717009, 26.7812012451), (-53.6363086646, 26.7812012451))
            Line((-53.6363086646, 26.7812012451), (30.4130983075, 26.7812012451))
            Line((30.4130983075, 26.7812012451), (34.857919652, 26.7812012451))
            ThreePointArc((34.857919652, 26.7812012451), (35.4082478015, 26.7039958071), (35.9160876252, 26.4783401729))
            ThreePointArc((35.9160876252, 26.4783401729), (36.4076128264, 26.1261211128), (36.6871265124, 25.5899053082))
            ThreePointArc((36.6871265124, 25.5899053082), (36.8147555829, 25.1944725114), (36.857919652, 24.7812012451))
            Line((36.857919652, 24.7812012451), (36.857919652, 20.1944987733))
            Line((36.857919652, 20.1944987733), (36.857919652, -15.8901915476))
            Line((36.857919652, -15.8901915476), (36.857919652, -20.4768940194))
            ThreePointArc((36.857919652, -20.4768940194), (36.8147555829, -20.8901652857), (36.6871265124, -21.2855980825))
            ThreePointArc((36.6871265124, -21.2855980825), (36.4076128264, -21.8218138871), (35.9160876252, -22.1740329472))
            ThreePointArc((35.9160876252, -22.1740329472), (35.4082478015, -22.3996885814), (34.857919652, -22.4768940194))
            Line((34.857919652, -22.4768940194), (30.4130983075, -22.4768940194))
            Line((30.4130983075, -22.4768940194), (-53.6363086646, -22.4768940194))
            Line((-53.6363086646, -22.4768940194), (-58.0811300092, -22.4768940194))
            ThreePointArc((-58.0811300092, -22.4768940194), (-58.6314581587, -22.3996885814), (-59.1392979824, -22.1740329472))
            ThreePointArc((-59.1392979824, -22.1740329472), (-59.6308231836, -21.8218138871), (-59.9103368696, -21.2855980825))
            ThreePointArc((-59.9103368696, -21.2855980825), (-60.0379659401, -20.8901652857), (-60.0811300092, -20.4768940194))
            Line((-60.0811300092, -20.4768940194), (-60.0811300092, -15.8901915476))
            Line((-60.0811300092, -15.8901915476), (-60.0811300092, 20.1944987733))
            Line((-60.0811300092, 20.1944987733), (-60.0811300092, 24.4774429368))
            ThreePointArc((-60.0811300092, 24.4774429368), (-60.0479477693, 24.8670410125), (-59.9493569321, 25.2454159171))
            ThreePointArc((-59.9493569321, 25.2454159171), (-59.6085321277, 26.1511483084), (-58.73700955, 26.5718157645))
        make_face(mode=Mode.SUBTRACT)
        Polygon((30.4130983075, 26.7812012451), (-53.6363086646, 26.7812012451), (-60.0811300092, 20.1944987733), (-60.0811300092, -15.8901915476), (-53.6363086646, -22.4768940194), (30.4130983075, -22.4768940194), (36.857919652, -15.8901915476), (36.857919652, 20.1944987733), align=None)
        with BuildLine():
            Line((36.857919652, -20.4768940194), (36.857919652, -15.8901915476))
            Line((36.857919652, -15.8901915476), (30.4130983075, -22.4768940194))
            Line((30.4130983075, -22.4768940194), (34.857919652, -22.4768940194))
            ThreePointArc((34.857919652, -22.4768940194), (35.4082478015, -22.3996885814), (35.9160876252, -22.1740329472))
            ThreePointArc((35.9160876252, -22.1740329472), (34.342700624, -20.2415851392), (36.7264253162, -20.9680545316))
            ThreePointArc((36.7264253162, -20.9680545316), (36.7165632812, -21.1280375797), (36.6871265124, -21.2855980825))
            ThreePointArc((36.6871265124, -21.2855980825), (36.8147555829, -20.8901652857), (36.857919652, -20.4768940194))
        make_face()
        with BuildLine():
            Line((34.857919652, 26.7812012451), (30.4130983075, 26.7812012451))
            Line((30.4130983075, 26.7812012451), (36.857919652, 20.1944987733))
            Line((36.857919652, 20.1944987733), (36.857919652, 24.7812012451))
            ThreePointArc((36.857919652, 24.7812012451), (36.8147555829, 25.1944725114), (36.6871265124, 25.5899053082))
            ThreePointArc((36.6871265124, 25.5899053082), (36.7165632812, 25.4323448054), (36.7264253162, 25.2723617573))
            ThreePointArc((36.7264253162, 25.2723617573), (34.342700624, 24.5458923649), (35.9160876252, 26.4783401729))
            ThreePointArc((35.9160876252, 26.4783401729), (35.4082478015, 26.7039958071), (34.857919652, 26.7812012451))
        make_face()
        with BuildLine():
            Line((-53.6363086646, -22.4768940194), (-60.0811300092, -15.8901915476))
            Line((-60.0811300092, -15.8901915476), (-60.0811300092, -20.4768940194))
            ThreePointArc((-60.0811300092, -20.4768940194), (-60.0379659401, -20.8901652857), (-59.9103368696, -21.2855980825))
            ThreePointArc((-59.9103368696, -21.2855980825), (-58.8070561381, -19.6753539832), (-57.3445105066, -20.9680545316))
            ThreePointArc((-57.3445105066, -20.9680545316), (-57.9206036976, -22.0492166404), (-59.1392979824, -22.1740329472))
            ThreePointArc((-59.1392979824, -22.1740329472), (-58.6314581587, -22.3996885814), (-58.0811300092, -22.4768940194))
            Line((-58.0811300092, -22.4768940194), (-53.6363086646, -22.4768940194))
        make_face()
        with BuildLine():
            Line((-53.6363086646, 26.7812012451), (-57.7773717009, 26.7812012451))
            ThreePointArc((-57.7773717009, 26.7812012451), (-58.2684793981, 26.728246254), (-58.73700955, 26.5718157645))
            ThreePointArc((-58.73700955, 26.5718157645), (-57.7583882707, 26.2246792336), (-57.3445105066, 25.2723617573))
            ThreePointArc((-57.3445105066, 25.2723617573), (-58.6335994491, 23.9698688611), (-59.9493569321, 25.2454159171))
            ThreePointArc((-59.9493569321, 25.2454159171), (-60.0479477693, 24.8670410125), (-60.0811300092, 24.4774429368))
            Line((-60.0811300092, 24.4774429368), (-60.0811300092, 20.1944987733))
            Line((-60.0811300092, 20.1944987733), (-53.6363086646, 26.7812012451))
        make_face()
    extrude(amount=F5_DEPTH)

    # F6
    f6_edges = [f5.edges().sort_by_distance(p)[0] for p in [
        (-11.459726, 29.781201, 49.223343),
        (-63.08113, 2.000274, 49.223343),
    ]]
    fillet(f6_edges, radius=F6_R)


solid = Compound([f2.part, f4.part, f5.part])
